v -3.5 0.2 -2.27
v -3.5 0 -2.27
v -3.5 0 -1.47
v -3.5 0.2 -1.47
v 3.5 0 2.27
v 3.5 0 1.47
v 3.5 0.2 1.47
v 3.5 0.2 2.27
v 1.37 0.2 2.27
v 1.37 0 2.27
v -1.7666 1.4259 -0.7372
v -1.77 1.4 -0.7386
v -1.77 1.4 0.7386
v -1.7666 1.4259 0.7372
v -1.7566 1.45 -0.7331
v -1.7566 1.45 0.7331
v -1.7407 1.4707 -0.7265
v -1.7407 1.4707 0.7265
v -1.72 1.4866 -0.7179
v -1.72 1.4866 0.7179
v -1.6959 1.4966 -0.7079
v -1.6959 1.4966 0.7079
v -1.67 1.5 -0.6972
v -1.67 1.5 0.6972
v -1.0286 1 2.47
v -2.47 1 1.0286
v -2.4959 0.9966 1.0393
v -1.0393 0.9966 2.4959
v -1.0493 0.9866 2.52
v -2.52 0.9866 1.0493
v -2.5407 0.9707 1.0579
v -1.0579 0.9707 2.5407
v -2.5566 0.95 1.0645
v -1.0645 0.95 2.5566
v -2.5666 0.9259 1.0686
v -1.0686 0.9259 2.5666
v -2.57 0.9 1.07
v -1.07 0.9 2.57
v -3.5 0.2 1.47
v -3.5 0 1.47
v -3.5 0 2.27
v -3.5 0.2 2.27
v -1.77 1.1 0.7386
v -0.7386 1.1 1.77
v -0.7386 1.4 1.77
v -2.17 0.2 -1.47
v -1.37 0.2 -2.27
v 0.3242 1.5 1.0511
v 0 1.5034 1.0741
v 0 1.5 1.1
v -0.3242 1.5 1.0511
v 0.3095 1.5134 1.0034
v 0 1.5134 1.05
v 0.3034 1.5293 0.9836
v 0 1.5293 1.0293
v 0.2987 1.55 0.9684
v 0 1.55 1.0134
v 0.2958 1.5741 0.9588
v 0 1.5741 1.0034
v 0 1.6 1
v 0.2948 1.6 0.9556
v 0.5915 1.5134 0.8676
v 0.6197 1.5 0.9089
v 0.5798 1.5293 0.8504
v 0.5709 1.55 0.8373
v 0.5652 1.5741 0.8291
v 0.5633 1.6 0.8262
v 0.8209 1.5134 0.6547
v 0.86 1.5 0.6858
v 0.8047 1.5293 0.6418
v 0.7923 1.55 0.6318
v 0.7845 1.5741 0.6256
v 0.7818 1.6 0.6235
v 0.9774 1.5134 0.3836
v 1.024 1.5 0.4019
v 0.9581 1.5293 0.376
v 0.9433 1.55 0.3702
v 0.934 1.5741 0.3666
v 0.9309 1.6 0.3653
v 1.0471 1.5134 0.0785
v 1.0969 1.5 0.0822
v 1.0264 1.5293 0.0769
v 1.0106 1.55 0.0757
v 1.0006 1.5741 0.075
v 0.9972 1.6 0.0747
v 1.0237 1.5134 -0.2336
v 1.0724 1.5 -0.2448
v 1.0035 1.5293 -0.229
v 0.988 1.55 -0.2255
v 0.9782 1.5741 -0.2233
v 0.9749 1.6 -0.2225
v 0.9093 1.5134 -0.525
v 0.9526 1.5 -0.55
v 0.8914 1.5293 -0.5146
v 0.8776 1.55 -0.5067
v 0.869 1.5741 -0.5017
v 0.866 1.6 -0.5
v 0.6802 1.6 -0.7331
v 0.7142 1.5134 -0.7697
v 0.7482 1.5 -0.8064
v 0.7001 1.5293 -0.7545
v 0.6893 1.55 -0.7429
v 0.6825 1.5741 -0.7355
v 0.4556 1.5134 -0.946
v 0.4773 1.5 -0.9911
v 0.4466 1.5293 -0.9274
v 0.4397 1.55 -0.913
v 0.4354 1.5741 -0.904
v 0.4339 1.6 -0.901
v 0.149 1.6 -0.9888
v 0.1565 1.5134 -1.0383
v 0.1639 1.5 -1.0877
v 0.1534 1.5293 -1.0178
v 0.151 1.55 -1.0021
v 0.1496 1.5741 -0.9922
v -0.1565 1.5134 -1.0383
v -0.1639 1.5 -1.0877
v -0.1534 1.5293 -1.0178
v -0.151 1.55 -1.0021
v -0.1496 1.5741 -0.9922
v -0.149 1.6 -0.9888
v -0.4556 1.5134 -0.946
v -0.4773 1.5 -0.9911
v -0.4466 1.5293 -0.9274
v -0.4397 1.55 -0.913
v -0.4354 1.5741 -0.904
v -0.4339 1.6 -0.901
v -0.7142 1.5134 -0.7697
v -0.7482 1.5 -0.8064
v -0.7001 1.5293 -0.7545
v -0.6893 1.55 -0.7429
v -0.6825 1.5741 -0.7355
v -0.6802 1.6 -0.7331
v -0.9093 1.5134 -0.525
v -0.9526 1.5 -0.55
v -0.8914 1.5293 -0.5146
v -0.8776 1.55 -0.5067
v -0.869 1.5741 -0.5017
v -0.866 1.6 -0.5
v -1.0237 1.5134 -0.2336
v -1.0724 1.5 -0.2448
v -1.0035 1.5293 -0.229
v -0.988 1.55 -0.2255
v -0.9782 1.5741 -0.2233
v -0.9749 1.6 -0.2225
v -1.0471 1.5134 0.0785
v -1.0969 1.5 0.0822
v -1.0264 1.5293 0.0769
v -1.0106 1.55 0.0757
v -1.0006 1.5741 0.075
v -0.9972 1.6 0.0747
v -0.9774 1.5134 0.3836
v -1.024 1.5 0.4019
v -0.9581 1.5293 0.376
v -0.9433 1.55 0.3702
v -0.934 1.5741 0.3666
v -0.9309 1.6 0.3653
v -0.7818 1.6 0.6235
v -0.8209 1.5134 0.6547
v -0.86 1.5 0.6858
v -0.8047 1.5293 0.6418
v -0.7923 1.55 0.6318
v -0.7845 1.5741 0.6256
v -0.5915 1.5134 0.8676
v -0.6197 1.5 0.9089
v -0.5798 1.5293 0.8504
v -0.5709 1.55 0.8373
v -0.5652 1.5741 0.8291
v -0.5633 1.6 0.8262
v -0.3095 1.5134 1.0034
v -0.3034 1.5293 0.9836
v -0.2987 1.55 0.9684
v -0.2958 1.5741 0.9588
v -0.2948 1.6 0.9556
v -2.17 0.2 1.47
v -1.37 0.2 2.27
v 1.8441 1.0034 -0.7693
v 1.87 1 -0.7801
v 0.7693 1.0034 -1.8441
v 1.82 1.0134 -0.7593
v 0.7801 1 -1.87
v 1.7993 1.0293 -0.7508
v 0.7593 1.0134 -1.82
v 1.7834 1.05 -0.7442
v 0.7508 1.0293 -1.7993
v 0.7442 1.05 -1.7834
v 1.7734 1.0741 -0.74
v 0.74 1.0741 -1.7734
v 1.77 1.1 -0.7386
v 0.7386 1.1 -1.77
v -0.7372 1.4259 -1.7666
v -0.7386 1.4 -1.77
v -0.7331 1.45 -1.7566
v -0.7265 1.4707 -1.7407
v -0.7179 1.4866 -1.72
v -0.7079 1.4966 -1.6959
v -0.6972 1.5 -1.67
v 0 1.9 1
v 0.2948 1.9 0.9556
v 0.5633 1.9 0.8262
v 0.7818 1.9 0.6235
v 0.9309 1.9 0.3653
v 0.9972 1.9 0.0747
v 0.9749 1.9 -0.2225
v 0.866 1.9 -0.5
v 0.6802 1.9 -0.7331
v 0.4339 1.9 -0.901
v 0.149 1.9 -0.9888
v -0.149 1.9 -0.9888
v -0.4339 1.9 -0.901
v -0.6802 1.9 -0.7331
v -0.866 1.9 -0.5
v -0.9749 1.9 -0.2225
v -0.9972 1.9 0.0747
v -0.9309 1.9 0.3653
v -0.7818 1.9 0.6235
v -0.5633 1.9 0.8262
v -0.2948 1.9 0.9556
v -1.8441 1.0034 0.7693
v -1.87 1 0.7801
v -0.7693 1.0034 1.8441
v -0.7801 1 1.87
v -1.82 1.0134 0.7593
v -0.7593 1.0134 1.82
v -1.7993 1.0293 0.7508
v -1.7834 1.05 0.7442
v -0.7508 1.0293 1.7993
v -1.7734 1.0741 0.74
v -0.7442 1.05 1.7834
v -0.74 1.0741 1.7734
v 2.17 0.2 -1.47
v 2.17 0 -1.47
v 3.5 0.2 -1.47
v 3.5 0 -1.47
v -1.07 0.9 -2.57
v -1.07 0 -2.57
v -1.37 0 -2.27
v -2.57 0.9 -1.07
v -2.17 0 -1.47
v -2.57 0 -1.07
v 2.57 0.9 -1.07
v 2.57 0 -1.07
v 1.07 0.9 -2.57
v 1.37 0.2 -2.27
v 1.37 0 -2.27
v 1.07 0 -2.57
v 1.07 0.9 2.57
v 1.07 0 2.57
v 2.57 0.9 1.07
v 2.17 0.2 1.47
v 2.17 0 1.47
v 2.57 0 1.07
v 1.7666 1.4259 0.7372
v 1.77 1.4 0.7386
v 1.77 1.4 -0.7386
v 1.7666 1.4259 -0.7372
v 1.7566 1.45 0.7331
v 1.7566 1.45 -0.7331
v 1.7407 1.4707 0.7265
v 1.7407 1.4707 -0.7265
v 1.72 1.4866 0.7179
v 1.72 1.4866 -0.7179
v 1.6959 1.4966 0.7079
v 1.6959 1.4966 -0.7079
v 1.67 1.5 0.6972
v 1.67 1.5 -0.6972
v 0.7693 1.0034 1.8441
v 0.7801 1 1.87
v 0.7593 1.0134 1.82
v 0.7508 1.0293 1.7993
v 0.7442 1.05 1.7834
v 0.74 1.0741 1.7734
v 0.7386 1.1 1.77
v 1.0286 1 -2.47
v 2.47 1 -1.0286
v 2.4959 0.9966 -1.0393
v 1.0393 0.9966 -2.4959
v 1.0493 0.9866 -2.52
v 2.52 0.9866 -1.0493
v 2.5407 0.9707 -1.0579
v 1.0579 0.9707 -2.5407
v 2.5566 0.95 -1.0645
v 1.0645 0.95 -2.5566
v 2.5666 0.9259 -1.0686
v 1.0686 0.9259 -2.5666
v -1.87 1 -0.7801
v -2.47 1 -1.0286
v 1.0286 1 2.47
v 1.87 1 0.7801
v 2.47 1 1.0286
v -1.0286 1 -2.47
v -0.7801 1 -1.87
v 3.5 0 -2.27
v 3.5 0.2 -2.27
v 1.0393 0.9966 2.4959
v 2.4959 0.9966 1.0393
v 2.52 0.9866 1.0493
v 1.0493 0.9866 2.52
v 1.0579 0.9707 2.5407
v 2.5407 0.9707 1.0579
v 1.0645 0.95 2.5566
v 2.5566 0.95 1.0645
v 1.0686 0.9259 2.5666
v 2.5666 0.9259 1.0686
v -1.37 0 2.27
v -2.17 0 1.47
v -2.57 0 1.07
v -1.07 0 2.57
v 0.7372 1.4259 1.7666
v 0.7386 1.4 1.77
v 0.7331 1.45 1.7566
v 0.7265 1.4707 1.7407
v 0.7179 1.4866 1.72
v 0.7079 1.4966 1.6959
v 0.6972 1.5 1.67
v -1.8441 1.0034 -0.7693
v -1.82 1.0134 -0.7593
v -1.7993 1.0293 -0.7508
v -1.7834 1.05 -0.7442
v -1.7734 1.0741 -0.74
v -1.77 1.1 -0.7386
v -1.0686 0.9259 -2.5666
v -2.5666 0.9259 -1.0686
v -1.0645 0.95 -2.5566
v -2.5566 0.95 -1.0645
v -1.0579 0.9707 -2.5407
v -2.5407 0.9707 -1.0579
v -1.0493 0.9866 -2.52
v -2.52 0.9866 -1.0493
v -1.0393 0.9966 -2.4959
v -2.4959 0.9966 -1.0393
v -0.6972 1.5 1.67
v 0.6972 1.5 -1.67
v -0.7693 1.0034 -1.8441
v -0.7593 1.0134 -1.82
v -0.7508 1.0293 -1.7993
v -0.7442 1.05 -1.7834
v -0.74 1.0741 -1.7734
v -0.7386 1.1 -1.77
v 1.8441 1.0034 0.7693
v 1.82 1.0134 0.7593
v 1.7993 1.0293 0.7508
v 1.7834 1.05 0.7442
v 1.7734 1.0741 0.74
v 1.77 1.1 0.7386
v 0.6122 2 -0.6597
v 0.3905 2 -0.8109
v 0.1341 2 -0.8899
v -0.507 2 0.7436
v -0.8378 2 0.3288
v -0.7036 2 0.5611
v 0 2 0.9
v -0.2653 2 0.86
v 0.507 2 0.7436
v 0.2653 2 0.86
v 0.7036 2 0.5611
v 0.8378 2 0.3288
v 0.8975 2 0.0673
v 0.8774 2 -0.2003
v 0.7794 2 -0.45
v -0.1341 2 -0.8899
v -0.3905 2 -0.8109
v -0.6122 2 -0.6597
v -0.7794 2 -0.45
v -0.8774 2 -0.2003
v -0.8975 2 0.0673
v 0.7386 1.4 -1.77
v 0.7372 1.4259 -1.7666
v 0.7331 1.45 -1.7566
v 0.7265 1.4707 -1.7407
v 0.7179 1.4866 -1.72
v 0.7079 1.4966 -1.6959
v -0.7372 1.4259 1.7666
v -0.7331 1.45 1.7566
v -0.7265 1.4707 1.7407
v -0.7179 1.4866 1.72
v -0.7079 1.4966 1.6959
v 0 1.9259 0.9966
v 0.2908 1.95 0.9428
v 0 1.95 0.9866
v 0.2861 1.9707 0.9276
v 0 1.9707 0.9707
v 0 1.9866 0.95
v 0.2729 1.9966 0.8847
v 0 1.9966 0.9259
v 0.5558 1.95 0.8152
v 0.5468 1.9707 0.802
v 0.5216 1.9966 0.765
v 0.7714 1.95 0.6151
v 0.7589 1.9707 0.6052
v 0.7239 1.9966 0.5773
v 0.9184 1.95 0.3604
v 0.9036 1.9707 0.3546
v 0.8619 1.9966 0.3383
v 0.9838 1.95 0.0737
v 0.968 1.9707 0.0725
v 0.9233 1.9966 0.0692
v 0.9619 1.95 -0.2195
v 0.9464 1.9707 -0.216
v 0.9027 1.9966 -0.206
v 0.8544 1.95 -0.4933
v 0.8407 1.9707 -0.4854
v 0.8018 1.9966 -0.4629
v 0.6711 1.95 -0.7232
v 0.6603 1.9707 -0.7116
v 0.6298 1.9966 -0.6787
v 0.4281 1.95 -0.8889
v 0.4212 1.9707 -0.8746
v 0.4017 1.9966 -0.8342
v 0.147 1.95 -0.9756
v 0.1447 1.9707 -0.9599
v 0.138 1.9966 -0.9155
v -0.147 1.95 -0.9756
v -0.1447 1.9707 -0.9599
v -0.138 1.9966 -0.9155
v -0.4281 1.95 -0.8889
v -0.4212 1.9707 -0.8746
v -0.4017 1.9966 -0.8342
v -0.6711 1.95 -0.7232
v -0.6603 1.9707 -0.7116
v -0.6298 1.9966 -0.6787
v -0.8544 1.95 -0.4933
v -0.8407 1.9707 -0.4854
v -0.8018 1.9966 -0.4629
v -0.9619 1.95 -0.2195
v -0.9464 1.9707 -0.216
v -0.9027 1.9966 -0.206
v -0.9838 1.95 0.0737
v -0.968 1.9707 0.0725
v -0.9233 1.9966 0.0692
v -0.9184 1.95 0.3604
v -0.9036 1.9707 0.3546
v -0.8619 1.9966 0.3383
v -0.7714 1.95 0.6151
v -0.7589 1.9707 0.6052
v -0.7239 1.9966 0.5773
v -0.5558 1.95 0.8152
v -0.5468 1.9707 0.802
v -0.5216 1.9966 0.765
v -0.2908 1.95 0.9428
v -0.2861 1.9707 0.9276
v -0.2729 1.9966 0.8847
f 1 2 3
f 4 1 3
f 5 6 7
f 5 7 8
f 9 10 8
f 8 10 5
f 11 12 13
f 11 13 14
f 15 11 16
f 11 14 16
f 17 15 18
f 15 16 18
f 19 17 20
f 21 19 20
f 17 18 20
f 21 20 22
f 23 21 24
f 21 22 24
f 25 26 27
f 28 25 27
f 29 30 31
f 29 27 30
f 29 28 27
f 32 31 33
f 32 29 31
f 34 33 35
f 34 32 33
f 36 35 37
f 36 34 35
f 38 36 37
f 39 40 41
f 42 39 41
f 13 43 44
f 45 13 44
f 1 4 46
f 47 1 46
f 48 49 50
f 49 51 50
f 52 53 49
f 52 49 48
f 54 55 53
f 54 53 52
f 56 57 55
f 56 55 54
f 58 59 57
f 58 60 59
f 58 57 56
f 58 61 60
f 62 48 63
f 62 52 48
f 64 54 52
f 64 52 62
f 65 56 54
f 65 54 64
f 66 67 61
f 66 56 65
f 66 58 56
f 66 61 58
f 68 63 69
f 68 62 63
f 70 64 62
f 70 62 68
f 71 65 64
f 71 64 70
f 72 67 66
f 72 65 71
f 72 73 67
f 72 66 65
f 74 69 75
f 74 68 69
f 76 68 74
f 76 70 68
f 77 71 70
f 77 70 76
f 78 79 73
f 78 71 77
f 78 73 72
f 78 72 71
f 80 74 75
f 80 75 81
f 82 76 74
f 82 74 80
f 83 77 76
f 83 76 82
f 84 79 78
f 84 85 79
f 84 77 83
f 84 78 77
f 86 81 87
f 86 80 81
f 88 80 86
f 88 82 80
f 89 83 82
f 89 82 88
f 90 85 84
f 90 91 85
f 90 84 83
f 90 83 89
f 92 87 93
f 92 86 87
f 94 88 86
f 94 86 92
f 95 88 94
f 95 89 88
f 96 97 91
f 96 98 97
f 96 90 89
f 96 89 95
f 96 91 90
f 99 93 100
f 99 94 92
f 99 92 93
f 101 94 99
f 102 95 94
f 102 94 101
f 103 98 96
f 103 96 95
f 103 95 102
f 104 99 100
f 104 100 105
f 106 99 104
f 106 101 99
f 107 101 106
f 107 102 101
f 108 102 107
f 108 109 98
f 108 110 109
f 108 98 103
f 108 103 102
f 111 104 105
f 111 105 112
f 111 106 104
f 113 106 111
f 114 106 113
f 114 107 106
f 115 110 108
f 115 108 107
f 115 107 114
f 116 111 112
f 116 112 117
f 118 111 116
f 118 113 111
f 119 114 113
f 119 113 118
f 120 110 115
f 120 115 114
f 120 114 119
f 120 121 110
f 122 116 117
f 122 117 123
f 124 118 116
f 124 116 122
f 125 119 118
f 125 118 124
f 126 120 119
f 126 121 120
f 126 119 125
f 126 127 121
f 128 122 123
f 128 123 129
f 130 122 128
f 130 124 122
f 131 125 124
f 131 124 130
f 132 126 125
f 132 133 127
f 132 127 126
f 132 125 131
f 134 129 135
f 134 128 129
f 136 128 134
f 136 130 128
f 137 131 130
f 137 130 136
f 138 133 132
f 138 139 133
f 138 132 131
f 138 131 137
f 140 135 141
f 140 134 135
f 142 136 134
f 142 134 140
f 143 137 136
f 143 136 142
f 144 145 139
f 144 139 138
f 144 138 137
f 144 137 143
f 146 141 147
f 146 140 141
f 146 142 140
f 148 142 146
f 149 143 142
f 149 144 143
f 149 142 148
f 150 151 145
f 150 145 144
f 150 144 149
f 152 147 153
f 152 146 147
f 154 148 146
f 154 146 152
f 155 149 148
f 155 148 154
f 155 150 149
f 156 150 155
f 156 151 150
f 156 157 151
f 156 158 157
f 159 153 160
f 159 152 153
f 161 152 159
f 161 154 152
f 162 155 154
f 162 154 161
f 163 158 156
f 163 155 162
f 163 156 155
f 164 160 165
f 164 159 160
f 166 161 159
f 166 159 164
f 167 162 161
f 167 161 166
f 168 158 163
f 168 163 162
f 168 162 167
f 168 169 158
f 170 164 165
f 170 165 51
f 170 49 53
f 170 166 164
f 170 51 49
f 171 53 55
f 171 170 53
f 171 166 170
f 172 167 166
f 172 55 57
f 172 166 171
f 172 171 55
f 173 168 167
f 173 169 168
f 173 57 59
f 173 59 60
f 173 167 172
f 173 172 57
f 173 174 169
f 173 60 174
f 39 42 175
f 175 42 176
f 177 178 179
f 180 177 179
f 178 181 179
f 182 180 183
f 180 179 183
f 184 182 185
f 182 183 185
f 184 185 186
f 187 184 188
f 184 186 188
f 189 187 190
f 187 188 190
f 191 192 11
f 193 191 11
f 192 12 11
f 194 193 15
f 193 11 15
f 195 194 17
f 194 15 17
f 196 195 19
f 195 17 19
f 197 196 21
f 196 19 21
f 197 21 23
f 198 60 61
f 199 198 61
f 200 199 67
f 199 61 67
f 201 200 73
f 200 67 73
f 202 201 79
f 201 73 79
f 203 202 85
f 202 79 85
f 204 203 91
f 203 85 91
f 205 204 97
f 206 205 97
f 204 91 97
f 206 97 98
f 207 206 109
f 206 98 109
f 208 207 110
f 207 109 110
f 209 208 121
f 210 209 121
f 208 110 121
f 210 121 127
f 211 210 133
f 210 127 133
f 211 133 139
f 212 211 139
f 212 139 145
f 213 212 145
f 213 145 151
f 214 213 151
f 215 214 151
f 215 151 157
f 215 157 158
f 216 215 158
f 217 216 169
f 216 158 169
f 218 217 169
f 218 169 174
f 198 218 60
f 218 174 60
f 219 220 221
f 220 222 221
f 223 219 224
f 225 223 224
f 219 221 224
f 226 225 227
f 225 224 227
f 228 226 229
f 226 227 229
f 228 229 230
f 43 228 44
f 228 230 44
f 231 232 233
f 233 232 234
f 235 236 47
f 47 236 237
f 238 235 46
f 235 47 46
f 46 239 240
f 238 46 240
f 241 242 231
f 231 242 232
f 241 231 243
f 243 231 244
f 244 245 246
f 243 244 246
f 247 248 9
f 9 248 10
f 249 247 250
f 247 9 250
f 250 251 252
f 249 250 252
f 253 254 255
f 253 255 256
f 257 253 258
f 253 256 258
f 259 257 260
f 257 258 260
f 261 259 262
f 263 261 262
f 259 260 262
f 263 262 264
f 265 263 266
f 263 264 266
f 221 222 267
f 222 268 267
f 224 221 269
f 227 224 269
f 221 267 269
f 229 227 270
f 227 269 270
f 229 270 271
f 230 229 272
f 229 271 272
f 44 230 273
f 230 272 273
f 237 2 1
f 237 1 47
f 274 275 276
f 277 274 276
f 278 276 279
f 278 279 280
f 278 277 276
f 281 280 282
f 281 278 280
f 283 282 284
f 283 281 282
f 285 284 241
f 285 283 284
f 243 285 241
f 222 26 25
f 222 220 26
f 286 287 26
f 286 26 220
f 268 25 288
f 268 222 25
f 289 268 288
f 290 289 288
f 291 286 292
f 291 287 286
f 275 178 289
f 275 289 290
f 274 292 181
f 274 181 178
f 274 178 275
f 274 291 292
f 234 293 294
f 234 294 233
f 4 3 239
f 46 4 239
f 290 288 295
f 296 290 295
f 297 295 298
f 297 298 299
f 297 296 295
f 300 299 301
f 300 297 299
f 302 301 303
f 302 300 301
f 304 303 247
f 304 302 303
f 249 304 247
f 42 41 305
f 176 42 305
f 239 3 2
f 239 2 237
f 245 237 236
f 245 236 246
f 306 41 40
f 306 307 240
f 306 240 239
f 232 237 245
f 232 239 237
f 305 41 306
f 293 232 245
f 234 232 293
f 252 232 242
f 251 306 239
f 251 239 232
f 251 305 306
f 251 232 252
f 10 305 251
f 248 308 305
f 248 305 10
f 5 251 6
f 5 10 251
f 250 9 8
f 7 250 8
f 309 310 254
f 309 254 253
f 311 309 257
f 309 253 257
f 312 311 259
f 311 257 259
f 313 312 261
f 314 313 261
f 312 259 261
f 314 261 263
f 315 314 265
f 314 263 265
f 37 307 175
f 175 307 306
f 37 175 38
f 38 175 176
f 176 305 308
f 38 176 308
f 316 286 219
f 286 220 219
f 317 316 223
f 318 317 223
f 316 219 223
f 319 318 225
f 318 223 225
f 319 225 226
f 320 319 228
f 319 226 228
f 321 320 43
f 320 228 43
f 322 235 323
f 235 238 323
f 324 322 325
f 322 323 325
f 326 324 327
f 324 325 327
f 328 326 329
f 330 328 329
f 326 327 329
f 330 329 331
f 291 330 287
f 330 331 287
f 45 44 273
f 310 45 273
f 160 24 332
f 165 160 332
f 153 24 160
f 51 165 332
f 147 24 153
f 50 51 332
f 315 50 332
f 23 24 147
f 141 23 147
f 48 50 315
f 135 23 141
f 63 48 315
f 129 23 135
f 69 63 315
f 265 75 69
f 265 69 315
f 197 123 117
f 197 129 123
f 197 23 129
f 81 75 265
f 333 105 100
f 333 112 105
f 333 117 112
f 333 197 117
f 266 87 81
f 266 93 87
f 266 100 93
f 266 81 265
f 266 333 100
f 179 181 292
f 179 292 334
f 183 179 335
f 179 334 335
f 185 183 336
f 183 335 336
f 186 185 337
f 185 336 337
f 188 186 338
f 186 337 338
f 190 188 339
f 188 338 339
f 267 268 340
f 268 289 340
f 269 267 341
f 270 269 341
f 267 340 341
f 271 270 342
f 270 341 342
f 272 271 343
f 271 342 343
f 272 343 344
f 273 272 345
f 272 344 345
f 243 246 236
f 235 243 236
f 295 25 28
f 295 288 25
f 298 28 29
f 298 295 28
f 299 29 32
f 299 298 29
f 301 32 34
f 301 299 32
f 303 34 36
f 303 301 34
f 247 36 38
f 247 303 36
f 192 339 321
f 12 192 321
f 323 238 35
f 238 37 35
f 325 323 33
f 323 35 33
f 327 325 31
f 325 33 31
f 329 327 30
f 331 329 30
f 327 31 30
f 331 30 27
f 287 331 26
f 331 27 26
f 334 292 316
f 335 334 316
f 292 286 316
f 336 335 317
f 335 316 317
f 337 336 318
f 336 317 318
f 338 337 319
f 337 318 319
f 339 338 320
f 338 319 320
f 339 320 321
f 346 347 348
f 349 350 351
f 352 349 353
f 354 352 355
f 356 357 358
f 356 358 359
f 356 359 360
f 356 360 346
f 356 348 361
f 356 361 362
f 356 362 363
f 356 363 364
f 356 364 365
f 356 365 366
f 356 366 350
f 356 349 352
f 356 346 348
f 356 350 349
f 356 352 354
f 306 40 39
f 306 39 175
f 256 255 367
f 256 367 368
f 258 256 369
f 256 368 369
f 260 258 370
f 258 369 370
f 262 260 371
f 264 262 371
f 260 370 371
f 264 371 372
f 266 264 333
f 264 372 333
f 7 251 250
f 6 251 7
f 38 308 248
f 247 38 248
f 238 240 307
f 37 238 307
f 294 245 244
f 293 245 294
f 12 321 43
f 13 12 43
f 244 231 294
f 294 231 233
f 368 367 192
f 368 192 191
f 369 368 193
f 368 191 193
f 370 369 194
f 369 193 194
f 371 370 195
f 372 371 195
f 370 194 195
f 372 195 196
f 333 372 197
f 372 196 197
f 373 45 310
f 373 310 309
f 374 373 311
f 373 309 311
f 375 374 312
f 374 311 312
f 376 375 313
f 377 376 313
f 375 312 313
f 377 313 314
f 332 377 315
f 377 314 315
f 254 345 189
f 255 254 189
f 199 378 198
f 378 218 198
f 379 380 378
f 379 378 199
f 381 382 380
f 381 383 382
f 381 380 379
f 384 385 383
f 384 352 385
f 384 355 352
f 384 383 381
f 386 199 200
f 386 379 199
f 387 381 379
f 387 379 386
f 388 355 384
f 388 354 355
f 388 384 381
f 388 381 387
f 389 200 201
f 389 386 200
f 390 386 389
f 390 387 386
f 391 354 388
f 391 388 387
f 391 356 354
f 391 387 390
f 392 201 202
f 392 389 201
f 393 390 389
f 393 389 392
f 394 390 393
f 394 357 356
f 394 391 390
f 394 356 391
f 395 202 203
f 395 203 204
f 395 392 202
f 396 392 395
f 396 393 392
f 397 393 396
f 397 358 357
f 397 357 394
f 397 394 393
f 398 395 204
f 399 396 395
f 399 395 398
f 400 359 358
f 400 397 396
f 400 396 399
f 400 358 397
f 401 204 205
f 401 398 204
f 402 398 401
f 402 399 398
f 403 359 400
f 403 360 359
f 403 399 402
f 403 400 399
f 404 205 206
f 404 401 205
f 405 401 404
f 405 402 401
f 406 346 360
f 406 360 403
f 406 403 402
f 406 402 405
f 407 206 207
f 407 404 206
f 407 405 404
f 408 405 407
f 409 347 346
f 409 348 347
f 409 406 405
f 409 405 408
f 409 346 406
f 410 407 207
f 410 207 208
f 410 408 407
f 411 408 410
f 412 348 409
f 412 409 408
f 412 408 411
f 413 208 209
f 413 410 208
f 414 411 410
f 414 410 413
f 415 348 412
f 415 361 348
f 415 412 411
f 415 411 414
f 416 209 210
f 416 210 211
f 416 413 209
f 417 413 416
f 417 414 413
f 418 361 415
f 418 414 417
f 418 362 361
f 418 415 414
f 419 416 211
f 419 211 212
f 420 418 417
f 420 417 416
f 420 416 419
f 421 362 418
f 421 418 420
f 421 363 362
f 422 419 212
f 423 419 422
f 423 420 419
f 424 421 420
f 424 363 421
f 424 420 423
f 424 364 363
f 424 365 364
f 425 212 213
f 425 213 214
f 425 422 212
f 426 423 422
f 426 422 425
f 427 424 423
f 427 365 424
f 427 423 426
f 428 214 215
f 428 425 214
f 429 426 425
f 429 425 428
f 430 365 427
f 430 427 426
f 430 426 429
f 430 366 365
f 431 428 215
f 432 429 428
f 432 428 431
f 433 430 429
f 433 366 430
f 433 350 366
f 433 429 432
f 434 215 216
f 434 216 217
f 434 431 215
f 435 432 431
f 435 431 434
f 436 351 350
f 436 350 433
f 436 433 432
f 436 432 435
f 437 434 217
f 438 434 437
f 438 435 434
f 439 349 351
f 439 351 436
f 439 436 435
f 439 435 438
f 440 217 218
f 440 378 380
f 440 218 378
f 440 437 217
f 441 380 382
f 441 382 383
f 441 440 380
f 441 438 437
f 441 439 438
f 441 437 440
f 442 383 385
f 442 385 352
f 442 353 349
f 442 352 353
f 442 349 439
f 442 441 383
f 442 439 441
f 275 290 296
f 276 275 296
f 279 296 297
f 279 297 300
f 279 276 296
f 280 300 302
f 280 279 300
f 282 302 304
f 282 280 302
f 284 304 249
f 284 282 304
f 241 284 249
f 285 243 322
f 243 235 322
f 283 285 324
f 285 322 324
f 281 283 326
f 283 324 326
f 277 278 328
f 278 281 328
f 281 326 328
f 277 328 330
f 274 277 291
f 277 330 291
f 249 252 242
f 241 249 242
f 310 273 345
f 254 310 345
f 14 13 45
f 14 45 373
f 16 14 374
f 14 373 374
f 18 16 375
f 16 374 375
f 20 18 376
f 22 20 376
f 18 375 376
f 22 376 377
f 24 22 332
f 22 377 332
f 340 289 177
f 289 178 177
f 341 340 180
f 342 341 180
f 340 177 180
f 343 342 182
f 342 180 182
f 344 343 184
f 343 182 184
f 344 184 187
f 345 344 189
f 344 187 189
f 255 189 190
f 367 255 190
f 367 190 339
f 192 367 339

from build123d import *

# Parameters (mm, degrees)
BOSS_EXTRUDE1_DEPTH = 1
BOSS_EXTRUDE2_DEPTH = 0.5
SKETCH3_R           = 1
BOSS_EXTRUDE3_DEPTH = 0.5
FILLET1_R           = 0.1
SKETCH4_W           = 7
SKETCH4_H           = 0.8
BOSS_EXTRUDE4_DEPTH = 0.2
FILLET2_R           = 0.1


with BuildPart() as part:
    # Sketch1 → Boss-Extrude1 (new body)
    with BuildSketch(Plane(origin=(0, 0, 0), x_dir=(1, 0, 0), z_dir=(0, 1, 0))):
        Polygon((-1.07, 2.57), (-2.57, 1.07), (-2.57, -1.07), (-1.07, -2.57), (1.07, -2.57), (2.57, -1.07), (2.57, 1.07), (1.07, 2.57), align=None)
    extrude(amount=BOSS_EXTRUDE1_DEPTH)

    # Sketch2 → Boss-Extrude2 (add)
    with BuildSketch(Plane(origin=(0, 1, 0), x_dir=(1, 0, 0), z_dir=(0, 1, 0))):
        Polygon((-1.77, 0.73862915), (-1.77, -0.73862915), (-0.73862915, -1.77), (0.73862915, -1.77), (1.77, -0.73862915), (1.77, 0.73862915), (0.73862915, 1.77), (-0.73862915, 1.77), align=None)
    extrude(amount=BOSS_EXTRUDE2_DEPTH)

    # Sketch3 → Boss-Extrude3 (add)
    with BuildSketch(Plane(origin=(0, 1.5, 0), x_dir=(1, 0, 0), z_dir=(0, 1, 0))):
        with Locations(Location((0, 0, 0), (0, 0, 270))):
            Circle(SKETCH3_R)
    extrude(amount=BOSS_EXTRUDE3_DEPTH)

    # Fillet1
    fillet1_edges = [part.edges().sort_by_distance(p)[0] for p in [
        (0, 1, 2.57),
        (1.82, 1, 1.82),
        (2.57, 1, 0),
        (1.82, 1, -1.82),
        (-1.254314575, 1, -1.254314575),
        (-1.77, 1, 0),
        (-1.254314575, 1, 1.254314575),
        (0, 1, -2.57),
        (0, 1, 1.77),
        (1.254314575, 1, 1.254314575),
        (1.77, 1, 0),
        (1.254314575, 1, -1.254314575),
        (0, 1, -1.77),
        (-1.254314575, 1.5, -1.254314575),
        (-1.77, 1.5, 0),
        (-1.254314575, 1.5, 1.254314575),
        (0, 1.5, 1.77),
        (1.254314575, 1.5, 1.254314575),
        (1.77, 1.5, 0),
        (1.254314575, 1.5, -1.254314575),
        (-1.82, 1, -1.82),
        (0, 1.5, -1.77),
        (0, 1.5, -1),
        (-2.57, 1, 0),
        (-1.82, 1, 1.82),
    ]]
    fillet(fillet1_edges, radius=FILLET1_R)

    # Sketch4 → Boss-Extrude4 (add)
    with BuildSketch(Plane.XZ):
        with Locations((0, 1.87)):
            Rectangle(SKETCH4_W, SKETCH4_H)
        with Locations((0, -1.87)):
            Rectangle(SKETCH4_W, SKETCH4_H)
    extrude(amount=-BOSS_EXTRUDE4_DEPTH)

    # Fillet2
    fillet2_edges = [part.edges().sort_by_distance(p)[0] for p in [
        (0, 2, -1),
    ]]
    fillet(fillet2_edges, radius=FILLET2_R)


solid = part.part
